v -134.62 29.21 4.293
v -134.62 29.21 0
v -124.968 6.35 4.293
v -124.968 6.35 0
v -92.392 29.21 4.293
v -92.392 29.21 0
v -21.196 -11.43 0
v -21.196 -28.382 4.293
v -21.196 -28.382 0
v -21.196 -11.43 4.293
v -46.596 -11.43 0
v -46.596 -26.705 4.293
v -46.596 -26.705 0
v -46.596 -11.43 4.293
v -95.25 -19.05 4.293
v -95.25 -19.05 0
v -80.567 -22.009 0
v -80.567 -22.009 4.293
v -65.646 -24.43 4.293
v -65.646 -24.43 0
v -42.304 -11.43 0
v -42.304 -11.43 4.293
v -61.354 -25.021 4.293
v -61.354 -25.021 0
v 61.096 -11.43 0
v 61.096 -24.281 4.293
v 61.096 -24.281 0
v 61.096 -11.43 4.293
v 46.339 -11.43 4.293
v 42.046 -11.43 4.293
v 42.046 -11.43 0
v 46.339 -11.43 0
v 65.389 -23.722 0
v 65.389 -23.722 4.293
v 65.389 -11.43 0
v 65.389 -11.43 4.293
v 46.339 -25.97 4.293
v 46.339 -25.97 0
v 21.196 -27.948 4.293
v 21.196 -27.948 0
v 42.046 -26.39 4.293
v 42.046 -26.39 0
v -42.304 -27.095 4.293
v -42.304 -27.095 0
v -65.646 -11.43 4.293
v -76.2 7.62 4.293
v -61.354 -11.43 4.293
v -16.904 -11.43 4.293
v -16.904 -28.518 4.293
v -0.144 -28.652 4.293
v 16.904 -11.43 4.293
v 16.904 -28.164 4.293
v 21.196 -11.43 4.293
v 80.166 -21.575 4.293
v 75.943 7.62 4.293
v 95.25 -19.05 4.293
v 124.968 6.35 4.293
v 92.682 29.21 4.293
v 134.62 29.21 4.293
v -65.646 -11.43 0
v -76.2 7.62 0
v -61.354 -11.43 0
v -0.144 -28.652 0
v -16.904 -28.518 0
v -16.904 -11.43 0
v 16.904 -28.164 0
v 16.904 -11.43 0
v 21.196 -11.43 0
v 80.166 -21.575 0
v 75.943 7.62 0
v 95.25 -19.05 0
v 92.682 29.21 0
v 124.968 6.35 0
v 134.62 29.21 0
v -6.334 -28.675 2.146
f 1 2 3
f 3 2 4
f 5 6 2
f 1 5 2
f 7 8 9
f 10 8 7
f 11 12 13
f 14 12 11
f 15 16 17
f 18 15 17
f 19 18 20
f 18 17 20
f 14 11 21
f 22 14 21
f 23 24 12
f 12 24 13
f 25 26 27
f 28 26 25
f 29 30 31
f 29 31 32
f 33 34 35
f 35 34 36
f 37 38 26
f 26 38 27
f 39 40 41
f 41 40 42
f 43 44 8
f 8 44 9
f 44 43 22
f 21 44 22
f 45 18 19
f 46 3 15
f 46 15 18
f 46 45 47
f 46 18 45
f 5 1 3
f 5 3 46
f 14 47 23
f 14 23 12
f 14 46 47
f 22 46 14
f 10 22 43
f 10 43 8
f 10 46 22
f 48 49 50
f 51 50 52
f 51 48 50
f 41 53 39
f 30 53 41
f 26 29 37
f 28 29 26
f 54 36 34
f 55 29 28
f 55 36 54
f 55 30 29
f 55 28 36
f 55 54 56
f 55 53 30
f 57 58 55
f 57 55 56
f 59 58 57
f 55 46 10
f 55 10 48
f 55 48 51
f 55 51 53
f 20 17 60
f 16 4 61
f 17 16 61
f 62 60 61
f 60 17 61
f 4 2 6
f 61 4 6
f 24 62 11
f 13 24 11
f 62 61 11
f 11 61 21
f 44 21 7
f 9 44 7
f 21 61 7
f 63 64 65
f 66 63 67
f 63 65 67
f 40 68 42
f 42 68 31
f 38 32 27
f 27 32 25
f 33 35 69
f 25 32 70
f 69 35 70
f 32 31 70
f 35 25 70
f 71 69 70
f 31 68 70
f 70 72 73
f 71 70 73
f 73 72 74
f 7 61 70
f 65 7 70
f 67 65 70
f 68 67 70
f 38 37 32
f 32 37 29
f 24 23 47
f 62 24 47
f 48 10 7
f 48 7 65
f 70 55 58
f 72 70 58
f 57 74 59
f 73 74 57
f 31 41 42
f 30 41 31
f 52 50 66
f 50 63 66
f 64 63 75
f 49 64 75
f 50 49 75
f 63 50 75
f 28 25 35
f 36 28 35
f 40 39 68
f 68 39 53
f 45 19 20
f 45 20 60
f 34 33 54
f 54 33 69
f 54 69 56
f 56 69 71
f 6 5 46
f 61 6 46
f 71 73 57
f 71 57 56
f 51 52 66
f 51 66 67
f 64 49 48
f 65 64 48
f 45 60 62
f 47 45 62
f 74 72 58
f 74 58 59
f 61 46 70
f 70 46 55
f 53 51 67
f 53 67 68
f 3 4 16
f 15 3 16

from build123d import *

# Parameters (mm, degrees)
SKETCH1_W           = 152.4
SKETCH1_H           = 38.1
BOSS_EXTRUDE1_DEPTH = 4.2926
SKETCH2_W           = 152.142509963
SKETCH2_H           = 11.43
CUT_EXTRUDE1_DEPTH  = 4.2926
SKETCH3_W           = 4.2926
SKETCH3_H           = 20.32
CUT_EXTRUDE2_DEPTH  = 4.2926


with BuildPart() as part:
    # Sketch1 → Boss-Extrude1 (new body)
    with BuildSketch(Plane.XY):
        Polygon((-83.82, 29.21), (-134.62, 29.21), (-124.968, 6.35), (-95.25, -19.05), (-76.2, -19.05), (-76.2, 19.05), align=None)
        Rectangle(SKETCH1_W, SKETCH1_H)
        with BuildLine():
            Line((-76.2, -19.05), (-95.25, -19.05))
            add(Edge.make_bspline(
                [(-95.25, -19.05), (-66.079235011, -25.514680938), (-2.12159074, -32.083739423), (61.761861898, -25.010246771), (95.25, -19.05)],
                knots=[0, 0, 0, 0, 0.467198678, 1, 1, 1, 1], degree=3))
            Line((95.25, -19.05), (76.2, -19.05))
            Line((76.2, -19.05), (-76.2, -19.05))
        make_face()
        Polygon((95.25, -19.05), (76.2, -19.05), (76.2, 19.05), (83.82, 29.21), (134.62, 29.21), (124.968, 6.35), align=None)
    extrude(amount=BOSS_EXTRUDE1_DEPTH)

    # Sketch2 → Cut-Extrude1 (cut)
    with BuildSketch(Plane.XY.offset(4.2926)):
        with Locations((-0.128745018, 13.335)):
            Rectangle(SKETCH2_W, SKETCH2_H)
    extrude(amount=-CUT_EXTRUDE1_DEPTH, mode=Mode.SUBTRACT)

    # Sketch3 → Cut-Extrude2 (cut)
    with BuildSketch(Plane.XY.offset(4.2926)):
        with Locations((-63.5, -21.59)):
            Rectangle(SKETCH3_W, SKETCH3_H)
        with Locations((-44.45, -21.59)):
            Rectangle(SKETCH3_W, SKETCH3_H)
        with Locations((-19.05, -21.59)):
            Rectangle(SKETCH3_W, SKETCH3_H)
        with Locations((44.192509963, -21.59)):
            Rectangle(SKETCH3_W, SKETCH3_H)
        with Locations((63.242509963, -21.59)):
            Rectangle(SKETCH3_W, SKETCH3_H)
        with Locations((19.05, -21.59)):
            Rectangle(SKETCH3_W, SKETCH3_H)
        Polygon((-92.3925, 29.21), (-76.2, 7.62), (-76.2, 19.05), (-83.82, 29.21), align=None)
        Polygon((75.942509963, 7.62), (92.682176292, 29.21), (83.82, 29.21), (75.942509963, 19.05), align=None)
    extrude(amount=-CUT_EXTRUDE2_DEPTH, mode=Mode.SUBTRACT)


solid = part.part
